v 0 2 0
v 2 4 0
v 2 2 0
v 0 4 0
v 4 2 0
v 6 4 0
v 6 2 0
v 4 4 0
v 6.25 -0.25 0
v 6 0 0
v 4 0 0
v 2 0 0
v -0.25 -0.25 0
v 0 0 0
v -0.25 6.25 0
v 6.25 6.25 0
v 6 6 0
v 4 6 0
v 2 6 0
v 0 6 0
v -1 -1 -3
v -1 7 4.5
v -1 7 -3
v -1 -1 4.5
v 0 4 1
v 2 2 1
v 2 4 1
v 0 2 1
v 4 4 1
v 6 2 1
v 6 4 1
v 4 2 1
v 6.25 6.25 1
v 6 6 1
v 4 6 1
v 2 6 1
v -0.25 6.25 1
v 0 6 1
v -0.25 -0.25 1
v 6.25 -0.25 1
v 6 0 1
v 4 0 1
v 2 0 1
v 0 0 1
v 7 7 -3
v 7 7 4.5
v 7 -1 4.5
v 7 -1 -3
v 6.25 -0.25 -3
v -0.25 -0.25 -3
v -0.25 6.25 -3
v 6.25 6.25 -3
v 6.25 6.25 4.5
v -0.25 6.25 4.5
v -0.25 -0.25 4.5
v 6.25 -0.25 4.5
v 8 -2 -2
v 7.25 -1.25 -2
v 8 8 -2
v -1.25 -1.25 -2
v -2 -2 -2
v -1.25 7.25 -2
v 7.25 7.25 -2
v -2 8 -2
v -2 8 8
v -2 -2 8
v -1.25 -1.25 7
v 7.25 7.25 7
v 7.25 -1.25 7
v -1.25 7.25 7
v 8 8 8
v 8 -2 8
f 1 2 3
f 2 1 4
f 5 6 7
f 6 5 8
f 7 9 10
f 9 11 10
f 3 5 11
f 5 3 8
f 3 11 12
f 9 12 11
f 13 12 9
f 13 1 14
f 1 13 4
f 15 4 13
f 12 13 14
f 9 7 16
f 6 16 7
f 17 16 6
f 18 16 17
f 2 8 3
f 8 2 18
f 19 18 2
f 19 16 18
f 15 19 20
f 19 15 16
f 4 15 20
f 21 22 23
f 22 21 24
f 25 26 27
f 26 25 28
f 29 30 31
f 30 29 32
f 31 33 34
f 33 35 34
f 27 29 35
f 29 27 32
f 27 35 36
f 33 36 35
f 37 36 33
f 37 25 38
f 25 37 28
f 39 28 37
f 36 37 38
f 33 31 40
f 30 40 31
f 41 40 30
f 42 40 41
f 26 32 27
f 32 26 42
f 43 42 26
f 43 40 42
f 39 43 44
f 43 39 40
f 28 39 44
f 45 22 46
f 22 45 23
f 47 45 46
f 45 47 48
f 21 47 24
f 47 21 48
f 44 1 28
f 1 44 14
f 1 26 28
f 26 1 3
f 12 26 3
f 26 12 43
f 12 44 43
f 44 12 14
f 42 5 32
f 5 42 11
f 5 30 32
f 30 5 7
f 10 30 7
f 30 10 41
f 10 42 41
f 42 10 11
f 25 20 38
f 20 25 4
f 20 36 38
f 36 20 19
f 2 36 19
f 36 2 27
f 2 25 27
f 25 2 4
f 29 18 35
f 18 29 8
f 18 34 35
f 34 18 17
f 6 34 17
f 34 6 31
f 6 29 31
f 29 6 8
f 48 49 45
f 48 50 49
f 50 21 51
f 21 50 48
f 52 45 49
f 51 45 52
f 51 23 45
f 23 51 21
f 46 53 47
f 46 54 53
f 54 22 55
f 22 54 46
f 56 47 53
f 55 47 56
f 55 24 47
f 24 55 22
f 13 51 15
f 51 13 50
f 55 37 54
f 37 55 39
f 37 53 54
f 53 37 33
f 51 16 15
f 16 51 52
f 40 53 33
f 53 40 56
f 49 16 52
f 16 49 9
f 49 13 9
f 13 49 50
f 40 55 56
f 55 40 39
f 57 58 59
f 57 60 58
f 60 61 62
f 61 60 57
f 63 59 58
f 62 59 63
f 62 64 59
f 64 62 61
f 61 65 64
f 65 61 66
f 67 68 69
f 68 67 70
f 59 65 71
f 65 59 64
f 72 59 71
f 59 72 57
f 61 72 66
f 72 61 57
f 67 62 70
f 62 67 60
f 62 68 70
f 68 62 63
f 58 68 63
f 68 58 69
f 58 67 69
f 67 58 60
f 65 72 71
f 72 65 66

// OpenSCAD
module base() {
    difference() {
        // base
        translate([-1, -1, 0])
            linear_extrude(1)
                square([8,8]);
        
        // cutouts for leg connections
        linear_extrude(1)
            square([2,2]);
        translate([4, 0, 0])
            linear_extrude(1)
                square([2,2]);
        translate([0, 4, 0])
            linear_extrude(1)
                square([2,2]);
        translate([4, 4, 0])
            linear_extrude(1)
                square([2,2]);
    }
}

module walls() {
    difference() {
        translate([-1, -1, -3])
            linear_extrude(7.5)
                square([8, 8]);
        color("blue")
            translate([-0.25, -0.25, -3])
                linear_extrude(7.5)
                    square([6.5, 6.5]);
    }
}

module button_cap() {
    button_clicker_height = 2.5;
    button_clicker_travel = 0.3;
    
    union() {
        color("orange") translate([-2, -2, 4.5+button_clicker_height])
            linear_extrude(1)
                square([10,10]);
        difference() {
            color("blue") translate([-2, -2, -2])
                linear_extrude(9)
                    square([10, 10]);
            color("green") translate([-1.25, -1.25, -2])
                linear_extrude(9)
                    square([8.5, 8.5]);
        }
    }
}

module button_base() {
    union() {
        base();
        walls();
    }
}

button_base();
button_cap();
